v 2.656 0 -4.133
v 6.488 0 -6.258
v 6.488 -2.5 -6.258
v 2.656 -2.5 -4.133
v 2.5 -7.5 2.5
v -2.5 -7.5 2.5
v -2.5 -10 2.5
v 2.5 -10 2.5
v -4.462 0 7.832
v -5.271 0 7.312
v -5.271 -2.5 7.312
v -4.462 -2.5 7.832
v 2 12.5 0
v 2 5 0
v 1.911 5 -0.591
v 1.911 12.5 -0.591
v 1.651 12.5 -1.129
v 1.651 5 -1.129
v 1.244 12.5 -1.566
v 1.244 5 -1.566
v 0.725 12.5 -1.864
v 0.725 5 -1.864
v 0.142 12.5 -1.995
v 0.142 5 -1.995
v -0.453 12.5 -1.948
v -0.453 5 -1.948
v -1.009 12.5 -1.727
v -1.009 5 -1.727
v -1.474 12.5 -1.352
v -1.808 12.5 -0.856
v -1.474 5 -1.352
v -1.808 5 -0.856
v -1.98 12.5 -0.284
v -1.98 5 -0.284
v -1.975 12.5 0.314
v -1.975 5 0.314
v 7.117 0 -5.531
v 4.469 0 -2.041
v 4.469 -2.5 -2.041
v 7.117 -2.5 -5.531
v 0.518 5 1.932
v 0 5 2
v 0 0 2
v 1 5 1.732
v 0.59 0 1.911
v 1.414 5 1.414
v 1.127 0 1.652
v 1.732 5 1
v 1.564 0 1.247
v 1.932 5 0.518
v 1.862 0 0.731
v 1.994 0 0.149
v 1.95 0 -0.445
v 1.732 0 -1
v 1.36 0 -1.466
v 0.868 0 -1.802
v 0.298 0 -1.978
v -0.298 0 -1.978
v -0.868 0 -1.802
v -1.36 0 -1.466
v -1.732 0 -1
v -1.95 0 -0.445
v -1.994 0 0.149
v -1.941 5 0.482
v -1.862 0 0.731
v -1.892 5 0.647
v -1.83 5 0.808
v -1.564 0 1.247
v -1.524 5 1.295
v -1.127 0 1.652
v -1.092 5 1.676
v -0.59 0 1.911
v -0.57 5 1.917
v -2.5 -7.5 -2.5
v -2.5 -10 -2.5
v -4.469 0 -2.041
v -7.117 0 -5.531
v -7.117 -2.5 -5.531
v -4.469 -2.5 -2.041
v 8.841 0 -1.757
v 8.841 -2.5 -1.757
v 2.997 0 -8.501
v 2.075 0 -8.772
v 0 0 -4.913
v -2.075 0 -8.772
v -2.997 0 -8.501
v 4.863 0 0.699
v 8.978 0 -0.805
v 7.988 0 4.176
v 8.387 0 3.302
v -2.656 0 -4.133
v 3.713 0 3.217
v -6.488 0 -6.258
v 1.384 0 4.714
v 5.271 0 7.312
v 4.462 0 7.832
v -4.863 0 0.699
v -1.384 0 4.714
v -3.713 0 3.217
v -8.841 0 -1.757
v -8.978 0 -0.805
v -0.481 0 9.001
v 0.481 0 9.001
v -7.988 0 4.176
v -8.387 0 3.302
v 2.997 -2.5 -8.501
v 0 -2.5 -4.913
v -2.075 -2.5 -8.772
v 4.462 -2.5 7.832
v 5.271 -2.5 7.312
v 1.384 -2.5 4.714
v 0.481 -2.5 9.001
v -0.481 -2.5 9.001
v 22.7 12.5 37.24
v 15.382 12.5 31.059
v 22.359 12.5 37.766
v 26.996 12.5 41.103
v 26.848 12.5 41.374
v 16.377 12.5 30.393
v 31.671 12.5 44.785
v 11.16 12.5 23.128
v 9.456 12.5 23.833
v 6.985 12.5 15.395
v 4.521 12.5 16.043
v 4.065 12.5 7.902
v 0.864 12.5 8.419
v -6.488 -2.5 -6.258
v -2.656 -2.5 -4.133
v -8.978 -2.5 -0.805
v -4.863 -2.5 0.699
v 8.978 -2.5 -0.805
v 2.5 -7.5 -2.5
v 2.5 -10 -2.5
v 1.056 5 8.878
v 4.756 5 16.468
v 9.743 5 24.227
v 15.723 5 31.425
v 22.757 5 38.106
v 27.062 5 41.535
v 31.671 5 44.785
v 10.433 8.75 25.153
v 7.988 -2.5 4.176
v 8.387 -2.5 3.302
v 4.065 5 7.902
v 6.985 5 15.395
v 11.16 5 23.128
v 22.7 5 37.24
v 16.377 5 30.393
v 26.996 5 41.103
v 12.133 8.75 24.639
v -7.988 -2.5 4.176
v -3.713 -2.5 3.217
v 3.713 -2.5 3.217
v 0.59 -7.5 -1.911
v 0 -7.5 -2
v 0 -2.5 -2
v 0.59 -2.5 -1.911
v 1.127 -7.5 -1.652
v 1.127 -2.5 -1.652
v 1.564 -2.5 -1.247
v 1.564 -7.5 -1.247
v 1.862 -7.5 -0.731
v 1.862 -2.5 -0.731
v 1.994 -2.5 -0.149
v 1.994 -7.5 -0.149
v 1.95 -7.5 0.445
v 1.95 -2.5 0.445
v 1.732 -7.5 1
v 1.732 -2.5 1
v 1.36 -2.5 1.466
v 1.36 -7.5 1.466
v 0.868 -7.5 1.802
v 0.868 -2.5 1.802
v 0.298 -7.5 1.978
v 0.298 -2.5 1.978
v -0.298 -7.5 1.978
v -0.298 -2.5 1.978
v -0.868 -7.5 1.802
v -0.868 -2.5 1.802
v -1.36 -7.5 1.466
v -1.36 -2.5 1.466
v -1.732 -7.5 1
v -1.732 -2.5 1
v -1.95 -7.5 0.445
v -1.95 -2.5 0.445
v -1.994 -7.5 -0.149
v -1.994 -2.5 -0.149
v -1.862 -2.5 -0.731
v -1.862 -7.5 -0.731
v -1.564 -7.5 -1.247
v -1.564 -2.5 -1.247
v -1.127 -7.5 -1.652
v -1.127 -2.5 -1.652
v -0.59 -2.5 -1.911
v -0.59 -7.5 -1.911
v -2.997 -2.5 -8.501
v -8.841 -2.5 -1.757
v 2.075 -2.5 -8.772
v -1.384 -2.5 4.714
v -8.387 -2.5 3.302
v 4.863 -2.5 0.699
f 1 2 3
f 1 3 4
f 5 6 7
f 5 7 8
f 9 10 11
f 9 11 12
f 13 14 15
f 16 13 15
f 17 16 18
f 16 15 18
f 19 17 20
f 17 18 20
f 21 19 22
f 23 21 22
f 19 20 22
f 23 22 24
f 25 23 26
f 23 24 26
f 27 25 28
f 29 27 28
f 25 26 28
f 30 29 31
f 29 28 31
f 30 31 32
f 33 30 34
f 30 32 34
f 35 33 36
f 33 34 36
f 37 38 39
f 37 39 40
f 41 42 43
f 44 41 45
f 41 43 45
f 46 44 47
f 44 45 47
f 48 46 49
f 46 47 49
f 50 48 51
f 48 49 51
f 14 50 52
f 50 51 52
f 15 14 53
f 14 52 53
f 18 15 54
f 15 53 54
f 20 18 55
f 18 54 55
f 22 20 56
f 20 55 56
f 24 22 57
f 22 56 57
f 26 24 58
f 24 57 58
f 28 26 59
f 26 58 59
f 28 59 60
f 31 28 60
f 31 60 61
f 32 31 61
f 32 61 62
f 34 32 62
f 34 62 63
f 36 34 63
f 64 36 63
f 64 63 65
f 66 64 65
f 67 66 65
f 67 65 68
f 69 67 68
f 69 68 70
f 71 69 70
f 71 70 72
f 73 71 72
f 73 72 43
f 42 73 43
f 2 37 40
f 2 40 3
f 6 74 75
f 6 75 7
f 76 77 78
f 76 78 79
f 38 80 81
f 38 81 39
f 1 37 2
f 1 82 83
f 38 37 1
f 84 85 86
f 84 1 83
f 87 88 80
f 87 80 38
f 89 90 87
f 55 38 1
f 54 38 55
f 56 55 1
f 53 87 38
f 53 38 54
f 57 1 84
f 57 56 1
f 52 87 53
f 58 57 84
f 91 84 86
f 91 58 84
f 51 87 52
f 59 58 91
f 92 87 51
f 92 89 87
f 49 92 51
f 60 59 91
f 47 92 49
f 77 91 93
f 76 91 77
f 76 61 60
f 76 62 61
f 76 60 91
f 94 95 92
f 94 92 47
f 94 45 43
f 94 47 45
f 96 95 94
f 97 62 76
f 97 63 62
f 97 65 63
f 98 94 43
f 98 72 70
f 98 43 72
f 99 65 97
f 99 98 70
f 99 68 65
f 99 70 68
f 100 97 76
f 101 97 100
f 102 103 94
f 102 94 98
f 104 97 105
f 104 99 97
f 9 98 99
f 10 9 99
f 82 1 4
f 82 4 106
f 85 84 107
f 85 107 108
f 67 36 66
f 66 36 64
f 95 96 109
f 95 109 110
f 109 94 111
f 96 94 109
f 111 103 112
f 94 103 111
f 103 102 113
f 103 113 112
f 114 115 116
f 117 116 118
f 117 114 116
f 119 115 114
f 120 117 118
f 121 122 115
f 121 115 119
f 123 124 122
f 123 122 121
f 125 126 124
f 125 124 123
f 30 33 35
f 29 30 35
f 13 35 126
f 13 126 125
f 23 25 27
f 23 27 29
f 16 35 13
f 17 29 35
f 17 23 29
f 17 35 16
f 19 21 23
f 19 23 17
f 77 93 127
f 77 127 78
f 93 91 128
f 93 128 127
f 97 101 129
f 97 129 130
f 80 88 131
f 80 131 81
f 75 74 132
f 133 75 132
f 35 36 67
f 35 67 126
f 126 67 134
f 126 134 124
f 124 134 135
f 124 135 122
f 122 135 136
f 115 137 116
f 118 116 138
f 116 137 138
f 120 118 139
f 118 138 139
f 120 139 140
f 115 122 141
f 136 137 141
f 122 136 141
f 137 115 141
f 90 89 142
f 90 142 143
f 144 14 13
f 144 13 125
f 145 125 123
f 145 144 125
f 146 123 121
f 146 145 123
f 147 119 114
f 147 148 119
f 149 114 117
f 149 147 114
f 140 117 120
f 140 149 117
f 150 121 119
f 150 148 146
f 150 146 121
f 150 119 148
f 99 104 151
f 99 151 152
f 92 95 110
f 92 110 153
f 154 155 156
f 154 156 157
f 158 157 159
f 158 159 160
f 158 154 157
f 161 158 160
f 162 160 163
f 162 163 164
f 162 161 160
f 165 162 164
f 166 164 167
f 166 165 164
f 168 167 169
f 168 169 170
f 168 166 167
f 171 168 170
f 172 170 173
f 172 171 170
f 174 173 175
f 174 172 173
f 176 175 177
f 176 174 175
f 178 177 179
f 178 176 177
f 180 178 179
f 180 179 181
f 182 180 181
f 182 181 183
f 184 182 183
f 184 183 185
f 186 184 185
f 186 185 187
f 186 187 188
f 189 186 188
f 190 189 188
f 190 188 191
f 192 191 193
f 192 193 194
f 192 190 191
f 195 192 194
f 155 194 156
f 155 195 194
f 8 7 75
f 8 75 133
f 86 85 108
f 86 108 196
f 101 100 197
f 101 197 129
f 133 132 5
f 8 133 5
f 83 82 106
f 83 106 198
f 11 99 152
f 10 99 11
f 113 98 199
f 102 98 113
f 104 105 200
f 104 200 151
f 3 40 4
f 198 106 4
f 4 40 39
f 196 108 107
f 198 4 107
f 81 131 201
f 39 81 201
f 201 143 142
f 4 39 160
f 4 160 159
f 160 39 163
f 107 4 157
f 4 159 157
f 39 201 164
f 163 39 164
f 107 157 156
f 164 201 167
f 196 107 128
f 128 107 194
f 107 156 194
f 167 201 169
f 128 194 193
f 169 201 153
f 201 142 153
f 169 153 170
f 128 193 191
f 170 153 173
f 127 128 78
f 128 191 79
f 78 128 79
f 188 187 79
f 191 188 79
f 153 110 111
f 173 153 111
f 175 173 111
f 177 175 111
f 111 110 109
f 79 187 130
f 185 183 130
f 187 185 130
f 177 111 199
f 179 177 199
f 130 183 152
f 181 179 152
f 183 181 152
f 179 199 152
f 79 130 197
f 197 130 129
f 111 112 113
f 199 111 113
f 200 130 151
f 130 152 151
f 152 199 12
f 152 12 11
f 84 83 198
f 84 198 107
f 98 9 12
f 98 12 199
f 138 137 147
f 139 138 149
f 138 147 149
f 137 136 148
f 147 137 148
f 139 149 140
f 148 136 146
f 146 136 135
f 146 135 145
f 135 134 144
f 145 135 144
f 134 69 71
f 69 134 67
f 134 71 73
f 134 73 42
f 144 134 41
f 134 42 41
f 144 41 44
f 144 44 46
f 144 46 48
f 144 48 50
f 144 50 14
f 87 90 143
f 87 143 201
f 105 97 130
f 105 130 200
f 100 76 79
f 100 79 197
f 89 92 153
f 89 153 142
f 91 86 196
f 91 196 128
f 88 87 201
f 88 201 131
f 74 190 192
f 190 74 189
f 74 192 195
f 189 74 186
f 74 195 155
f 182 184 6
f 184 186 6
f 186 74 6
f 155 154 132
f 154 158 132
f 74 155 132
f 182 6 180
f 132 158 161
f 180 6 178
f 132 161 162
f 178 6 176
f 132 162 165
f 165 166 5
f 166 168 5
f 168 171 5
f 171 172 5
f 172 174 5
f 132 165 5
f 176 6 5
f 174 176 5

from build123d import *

# Parameters (mm, degrees)
ESQUISSE1_R        = 2
BOSS_EXTRU_1_DEPTH = 5
BOSS_EXTRU_2_DEPTH = 7.5
BOSS_EXTRU_3_DEPTH = 2.5
BOSS_EXTRU_4_START = 5
ESQUISSE5_R        = 2
BOSS_EXTRU_4_DEPTH = 5
ESQUISSE6_W        = 5
ESQUISSE6_H        = 5
BOSS_EXTRU_5_DEPTH = 2.5


with BuildPart() as part:
    # Esquisse1 → Boss.-Extru.1 (new body)
    with BuildSketch(Plane(origin=(0, 0, 0), x_dir=(1, 0, 0), z_dir=(0, 1, 0))):
        with Locations(Location((0, 0, 0), (0, 0, 270))):
            Circle(ESQUISSE1_R)
    extrude(amount=BOSS_EXTRU_1_DEPTH)

    # Esquisse2 → Boss.-Extru.2 (add)
    with BuildSketch(Plane(origin=(0, 5, 0), x_dir=(1, 0, 0), z_dir=(0, 1, 0))):
        with BuildLine():
            ThreePointArc((2, 0), (-0.157353741, 1.993800341), (-1.9752398, -0.313731942))
            add(Edge.make_bspline(
                [(-1.9752398, -0.313731942), (6.018007313, -27.755724693), (31.670728762, -44.785499484)],
                knots=[0, 0, 0, 1, 1, 1], degree=2))
            add(Edge.make_bspline(
                [(2, 0), (7.431064096, -26.884767596), (31.670728762, -44.785499484)],
                knots=[0, 0, 0, 1, 1, 1], degree=2))
        make_face()
    extrude(amount=BOSS_EXTRU_2_DEPTH)

    # Esquisse4 → Boss.-Extru.3 (add)
    with BuildSketch(Plane.XZ):
        Polygon((-0.480726256, 9.001048314), (0.480719689, 9.001048314), (1.384199773, 4.71416076), (4.461921977, 7.832061849), (5.270741775, 7.312264927), (3.713131196, 3.217447416), (7.987940467, 4.176450473), (8.387339547, 3.301888479), (4.863168658, 0.699216639), (8.977843256, -0.805155029), (8.841015231, -1.756814841), (4.46918339, -2.041011092), (7.117343203, -5.53113011), (6.487730005, -6.257742475), (2.65626293, -4.133232834), (2.99713593, -8.501011074), (2.0746353, -8.771881699), (-3.284e-06, -4.913182966), (-2.074641867, -8.771881699), (-2.997142497, -8.501011074), (-2.656269497, -4.133232834), (-6.487736572, -6.257742475), (-7.11734977, -5.53113011), (-4.469189957, -2.041011092), (-8.841021798, -1.756814841), (-8.977849823, -0.805155029), (-4.863175225, 0.699216639), (-8.387346114, 3.301888479), (-7.987947034, 4.176450473), (-3.713137763, 3.217447416), (-5.270748343, 7.312264927), (-4.461928544, 7.832061849), (-1.38420634, 4.71416076), align=None)
    extrude(amount=BOSS_EXTRU_3_DEPTH)

    # Esquisse5 → Boss.-Extru.4 (add)
    with BuildSketch(Plane.XZ.offset(2.5).offset(BOSS_EXTRU_4_START)):
        with Locations(Location((0, 0, 0), (0, 0, 270))):
            Circle(ESQUISSE5_R)
    extrude(amount=-BOSS_EXTRU_4_DEPTH)

    # Esquisse6 → Boss.-Extru.5 (add)
    with BuildSketch(Plane.XZ.offset(7.5)):
        Rectangle(ESQUISSE6_W, ESQUISSE6_H)
    extrude(amount=BOSS_EXTRU_5_DEPTH)


solid = part.part
